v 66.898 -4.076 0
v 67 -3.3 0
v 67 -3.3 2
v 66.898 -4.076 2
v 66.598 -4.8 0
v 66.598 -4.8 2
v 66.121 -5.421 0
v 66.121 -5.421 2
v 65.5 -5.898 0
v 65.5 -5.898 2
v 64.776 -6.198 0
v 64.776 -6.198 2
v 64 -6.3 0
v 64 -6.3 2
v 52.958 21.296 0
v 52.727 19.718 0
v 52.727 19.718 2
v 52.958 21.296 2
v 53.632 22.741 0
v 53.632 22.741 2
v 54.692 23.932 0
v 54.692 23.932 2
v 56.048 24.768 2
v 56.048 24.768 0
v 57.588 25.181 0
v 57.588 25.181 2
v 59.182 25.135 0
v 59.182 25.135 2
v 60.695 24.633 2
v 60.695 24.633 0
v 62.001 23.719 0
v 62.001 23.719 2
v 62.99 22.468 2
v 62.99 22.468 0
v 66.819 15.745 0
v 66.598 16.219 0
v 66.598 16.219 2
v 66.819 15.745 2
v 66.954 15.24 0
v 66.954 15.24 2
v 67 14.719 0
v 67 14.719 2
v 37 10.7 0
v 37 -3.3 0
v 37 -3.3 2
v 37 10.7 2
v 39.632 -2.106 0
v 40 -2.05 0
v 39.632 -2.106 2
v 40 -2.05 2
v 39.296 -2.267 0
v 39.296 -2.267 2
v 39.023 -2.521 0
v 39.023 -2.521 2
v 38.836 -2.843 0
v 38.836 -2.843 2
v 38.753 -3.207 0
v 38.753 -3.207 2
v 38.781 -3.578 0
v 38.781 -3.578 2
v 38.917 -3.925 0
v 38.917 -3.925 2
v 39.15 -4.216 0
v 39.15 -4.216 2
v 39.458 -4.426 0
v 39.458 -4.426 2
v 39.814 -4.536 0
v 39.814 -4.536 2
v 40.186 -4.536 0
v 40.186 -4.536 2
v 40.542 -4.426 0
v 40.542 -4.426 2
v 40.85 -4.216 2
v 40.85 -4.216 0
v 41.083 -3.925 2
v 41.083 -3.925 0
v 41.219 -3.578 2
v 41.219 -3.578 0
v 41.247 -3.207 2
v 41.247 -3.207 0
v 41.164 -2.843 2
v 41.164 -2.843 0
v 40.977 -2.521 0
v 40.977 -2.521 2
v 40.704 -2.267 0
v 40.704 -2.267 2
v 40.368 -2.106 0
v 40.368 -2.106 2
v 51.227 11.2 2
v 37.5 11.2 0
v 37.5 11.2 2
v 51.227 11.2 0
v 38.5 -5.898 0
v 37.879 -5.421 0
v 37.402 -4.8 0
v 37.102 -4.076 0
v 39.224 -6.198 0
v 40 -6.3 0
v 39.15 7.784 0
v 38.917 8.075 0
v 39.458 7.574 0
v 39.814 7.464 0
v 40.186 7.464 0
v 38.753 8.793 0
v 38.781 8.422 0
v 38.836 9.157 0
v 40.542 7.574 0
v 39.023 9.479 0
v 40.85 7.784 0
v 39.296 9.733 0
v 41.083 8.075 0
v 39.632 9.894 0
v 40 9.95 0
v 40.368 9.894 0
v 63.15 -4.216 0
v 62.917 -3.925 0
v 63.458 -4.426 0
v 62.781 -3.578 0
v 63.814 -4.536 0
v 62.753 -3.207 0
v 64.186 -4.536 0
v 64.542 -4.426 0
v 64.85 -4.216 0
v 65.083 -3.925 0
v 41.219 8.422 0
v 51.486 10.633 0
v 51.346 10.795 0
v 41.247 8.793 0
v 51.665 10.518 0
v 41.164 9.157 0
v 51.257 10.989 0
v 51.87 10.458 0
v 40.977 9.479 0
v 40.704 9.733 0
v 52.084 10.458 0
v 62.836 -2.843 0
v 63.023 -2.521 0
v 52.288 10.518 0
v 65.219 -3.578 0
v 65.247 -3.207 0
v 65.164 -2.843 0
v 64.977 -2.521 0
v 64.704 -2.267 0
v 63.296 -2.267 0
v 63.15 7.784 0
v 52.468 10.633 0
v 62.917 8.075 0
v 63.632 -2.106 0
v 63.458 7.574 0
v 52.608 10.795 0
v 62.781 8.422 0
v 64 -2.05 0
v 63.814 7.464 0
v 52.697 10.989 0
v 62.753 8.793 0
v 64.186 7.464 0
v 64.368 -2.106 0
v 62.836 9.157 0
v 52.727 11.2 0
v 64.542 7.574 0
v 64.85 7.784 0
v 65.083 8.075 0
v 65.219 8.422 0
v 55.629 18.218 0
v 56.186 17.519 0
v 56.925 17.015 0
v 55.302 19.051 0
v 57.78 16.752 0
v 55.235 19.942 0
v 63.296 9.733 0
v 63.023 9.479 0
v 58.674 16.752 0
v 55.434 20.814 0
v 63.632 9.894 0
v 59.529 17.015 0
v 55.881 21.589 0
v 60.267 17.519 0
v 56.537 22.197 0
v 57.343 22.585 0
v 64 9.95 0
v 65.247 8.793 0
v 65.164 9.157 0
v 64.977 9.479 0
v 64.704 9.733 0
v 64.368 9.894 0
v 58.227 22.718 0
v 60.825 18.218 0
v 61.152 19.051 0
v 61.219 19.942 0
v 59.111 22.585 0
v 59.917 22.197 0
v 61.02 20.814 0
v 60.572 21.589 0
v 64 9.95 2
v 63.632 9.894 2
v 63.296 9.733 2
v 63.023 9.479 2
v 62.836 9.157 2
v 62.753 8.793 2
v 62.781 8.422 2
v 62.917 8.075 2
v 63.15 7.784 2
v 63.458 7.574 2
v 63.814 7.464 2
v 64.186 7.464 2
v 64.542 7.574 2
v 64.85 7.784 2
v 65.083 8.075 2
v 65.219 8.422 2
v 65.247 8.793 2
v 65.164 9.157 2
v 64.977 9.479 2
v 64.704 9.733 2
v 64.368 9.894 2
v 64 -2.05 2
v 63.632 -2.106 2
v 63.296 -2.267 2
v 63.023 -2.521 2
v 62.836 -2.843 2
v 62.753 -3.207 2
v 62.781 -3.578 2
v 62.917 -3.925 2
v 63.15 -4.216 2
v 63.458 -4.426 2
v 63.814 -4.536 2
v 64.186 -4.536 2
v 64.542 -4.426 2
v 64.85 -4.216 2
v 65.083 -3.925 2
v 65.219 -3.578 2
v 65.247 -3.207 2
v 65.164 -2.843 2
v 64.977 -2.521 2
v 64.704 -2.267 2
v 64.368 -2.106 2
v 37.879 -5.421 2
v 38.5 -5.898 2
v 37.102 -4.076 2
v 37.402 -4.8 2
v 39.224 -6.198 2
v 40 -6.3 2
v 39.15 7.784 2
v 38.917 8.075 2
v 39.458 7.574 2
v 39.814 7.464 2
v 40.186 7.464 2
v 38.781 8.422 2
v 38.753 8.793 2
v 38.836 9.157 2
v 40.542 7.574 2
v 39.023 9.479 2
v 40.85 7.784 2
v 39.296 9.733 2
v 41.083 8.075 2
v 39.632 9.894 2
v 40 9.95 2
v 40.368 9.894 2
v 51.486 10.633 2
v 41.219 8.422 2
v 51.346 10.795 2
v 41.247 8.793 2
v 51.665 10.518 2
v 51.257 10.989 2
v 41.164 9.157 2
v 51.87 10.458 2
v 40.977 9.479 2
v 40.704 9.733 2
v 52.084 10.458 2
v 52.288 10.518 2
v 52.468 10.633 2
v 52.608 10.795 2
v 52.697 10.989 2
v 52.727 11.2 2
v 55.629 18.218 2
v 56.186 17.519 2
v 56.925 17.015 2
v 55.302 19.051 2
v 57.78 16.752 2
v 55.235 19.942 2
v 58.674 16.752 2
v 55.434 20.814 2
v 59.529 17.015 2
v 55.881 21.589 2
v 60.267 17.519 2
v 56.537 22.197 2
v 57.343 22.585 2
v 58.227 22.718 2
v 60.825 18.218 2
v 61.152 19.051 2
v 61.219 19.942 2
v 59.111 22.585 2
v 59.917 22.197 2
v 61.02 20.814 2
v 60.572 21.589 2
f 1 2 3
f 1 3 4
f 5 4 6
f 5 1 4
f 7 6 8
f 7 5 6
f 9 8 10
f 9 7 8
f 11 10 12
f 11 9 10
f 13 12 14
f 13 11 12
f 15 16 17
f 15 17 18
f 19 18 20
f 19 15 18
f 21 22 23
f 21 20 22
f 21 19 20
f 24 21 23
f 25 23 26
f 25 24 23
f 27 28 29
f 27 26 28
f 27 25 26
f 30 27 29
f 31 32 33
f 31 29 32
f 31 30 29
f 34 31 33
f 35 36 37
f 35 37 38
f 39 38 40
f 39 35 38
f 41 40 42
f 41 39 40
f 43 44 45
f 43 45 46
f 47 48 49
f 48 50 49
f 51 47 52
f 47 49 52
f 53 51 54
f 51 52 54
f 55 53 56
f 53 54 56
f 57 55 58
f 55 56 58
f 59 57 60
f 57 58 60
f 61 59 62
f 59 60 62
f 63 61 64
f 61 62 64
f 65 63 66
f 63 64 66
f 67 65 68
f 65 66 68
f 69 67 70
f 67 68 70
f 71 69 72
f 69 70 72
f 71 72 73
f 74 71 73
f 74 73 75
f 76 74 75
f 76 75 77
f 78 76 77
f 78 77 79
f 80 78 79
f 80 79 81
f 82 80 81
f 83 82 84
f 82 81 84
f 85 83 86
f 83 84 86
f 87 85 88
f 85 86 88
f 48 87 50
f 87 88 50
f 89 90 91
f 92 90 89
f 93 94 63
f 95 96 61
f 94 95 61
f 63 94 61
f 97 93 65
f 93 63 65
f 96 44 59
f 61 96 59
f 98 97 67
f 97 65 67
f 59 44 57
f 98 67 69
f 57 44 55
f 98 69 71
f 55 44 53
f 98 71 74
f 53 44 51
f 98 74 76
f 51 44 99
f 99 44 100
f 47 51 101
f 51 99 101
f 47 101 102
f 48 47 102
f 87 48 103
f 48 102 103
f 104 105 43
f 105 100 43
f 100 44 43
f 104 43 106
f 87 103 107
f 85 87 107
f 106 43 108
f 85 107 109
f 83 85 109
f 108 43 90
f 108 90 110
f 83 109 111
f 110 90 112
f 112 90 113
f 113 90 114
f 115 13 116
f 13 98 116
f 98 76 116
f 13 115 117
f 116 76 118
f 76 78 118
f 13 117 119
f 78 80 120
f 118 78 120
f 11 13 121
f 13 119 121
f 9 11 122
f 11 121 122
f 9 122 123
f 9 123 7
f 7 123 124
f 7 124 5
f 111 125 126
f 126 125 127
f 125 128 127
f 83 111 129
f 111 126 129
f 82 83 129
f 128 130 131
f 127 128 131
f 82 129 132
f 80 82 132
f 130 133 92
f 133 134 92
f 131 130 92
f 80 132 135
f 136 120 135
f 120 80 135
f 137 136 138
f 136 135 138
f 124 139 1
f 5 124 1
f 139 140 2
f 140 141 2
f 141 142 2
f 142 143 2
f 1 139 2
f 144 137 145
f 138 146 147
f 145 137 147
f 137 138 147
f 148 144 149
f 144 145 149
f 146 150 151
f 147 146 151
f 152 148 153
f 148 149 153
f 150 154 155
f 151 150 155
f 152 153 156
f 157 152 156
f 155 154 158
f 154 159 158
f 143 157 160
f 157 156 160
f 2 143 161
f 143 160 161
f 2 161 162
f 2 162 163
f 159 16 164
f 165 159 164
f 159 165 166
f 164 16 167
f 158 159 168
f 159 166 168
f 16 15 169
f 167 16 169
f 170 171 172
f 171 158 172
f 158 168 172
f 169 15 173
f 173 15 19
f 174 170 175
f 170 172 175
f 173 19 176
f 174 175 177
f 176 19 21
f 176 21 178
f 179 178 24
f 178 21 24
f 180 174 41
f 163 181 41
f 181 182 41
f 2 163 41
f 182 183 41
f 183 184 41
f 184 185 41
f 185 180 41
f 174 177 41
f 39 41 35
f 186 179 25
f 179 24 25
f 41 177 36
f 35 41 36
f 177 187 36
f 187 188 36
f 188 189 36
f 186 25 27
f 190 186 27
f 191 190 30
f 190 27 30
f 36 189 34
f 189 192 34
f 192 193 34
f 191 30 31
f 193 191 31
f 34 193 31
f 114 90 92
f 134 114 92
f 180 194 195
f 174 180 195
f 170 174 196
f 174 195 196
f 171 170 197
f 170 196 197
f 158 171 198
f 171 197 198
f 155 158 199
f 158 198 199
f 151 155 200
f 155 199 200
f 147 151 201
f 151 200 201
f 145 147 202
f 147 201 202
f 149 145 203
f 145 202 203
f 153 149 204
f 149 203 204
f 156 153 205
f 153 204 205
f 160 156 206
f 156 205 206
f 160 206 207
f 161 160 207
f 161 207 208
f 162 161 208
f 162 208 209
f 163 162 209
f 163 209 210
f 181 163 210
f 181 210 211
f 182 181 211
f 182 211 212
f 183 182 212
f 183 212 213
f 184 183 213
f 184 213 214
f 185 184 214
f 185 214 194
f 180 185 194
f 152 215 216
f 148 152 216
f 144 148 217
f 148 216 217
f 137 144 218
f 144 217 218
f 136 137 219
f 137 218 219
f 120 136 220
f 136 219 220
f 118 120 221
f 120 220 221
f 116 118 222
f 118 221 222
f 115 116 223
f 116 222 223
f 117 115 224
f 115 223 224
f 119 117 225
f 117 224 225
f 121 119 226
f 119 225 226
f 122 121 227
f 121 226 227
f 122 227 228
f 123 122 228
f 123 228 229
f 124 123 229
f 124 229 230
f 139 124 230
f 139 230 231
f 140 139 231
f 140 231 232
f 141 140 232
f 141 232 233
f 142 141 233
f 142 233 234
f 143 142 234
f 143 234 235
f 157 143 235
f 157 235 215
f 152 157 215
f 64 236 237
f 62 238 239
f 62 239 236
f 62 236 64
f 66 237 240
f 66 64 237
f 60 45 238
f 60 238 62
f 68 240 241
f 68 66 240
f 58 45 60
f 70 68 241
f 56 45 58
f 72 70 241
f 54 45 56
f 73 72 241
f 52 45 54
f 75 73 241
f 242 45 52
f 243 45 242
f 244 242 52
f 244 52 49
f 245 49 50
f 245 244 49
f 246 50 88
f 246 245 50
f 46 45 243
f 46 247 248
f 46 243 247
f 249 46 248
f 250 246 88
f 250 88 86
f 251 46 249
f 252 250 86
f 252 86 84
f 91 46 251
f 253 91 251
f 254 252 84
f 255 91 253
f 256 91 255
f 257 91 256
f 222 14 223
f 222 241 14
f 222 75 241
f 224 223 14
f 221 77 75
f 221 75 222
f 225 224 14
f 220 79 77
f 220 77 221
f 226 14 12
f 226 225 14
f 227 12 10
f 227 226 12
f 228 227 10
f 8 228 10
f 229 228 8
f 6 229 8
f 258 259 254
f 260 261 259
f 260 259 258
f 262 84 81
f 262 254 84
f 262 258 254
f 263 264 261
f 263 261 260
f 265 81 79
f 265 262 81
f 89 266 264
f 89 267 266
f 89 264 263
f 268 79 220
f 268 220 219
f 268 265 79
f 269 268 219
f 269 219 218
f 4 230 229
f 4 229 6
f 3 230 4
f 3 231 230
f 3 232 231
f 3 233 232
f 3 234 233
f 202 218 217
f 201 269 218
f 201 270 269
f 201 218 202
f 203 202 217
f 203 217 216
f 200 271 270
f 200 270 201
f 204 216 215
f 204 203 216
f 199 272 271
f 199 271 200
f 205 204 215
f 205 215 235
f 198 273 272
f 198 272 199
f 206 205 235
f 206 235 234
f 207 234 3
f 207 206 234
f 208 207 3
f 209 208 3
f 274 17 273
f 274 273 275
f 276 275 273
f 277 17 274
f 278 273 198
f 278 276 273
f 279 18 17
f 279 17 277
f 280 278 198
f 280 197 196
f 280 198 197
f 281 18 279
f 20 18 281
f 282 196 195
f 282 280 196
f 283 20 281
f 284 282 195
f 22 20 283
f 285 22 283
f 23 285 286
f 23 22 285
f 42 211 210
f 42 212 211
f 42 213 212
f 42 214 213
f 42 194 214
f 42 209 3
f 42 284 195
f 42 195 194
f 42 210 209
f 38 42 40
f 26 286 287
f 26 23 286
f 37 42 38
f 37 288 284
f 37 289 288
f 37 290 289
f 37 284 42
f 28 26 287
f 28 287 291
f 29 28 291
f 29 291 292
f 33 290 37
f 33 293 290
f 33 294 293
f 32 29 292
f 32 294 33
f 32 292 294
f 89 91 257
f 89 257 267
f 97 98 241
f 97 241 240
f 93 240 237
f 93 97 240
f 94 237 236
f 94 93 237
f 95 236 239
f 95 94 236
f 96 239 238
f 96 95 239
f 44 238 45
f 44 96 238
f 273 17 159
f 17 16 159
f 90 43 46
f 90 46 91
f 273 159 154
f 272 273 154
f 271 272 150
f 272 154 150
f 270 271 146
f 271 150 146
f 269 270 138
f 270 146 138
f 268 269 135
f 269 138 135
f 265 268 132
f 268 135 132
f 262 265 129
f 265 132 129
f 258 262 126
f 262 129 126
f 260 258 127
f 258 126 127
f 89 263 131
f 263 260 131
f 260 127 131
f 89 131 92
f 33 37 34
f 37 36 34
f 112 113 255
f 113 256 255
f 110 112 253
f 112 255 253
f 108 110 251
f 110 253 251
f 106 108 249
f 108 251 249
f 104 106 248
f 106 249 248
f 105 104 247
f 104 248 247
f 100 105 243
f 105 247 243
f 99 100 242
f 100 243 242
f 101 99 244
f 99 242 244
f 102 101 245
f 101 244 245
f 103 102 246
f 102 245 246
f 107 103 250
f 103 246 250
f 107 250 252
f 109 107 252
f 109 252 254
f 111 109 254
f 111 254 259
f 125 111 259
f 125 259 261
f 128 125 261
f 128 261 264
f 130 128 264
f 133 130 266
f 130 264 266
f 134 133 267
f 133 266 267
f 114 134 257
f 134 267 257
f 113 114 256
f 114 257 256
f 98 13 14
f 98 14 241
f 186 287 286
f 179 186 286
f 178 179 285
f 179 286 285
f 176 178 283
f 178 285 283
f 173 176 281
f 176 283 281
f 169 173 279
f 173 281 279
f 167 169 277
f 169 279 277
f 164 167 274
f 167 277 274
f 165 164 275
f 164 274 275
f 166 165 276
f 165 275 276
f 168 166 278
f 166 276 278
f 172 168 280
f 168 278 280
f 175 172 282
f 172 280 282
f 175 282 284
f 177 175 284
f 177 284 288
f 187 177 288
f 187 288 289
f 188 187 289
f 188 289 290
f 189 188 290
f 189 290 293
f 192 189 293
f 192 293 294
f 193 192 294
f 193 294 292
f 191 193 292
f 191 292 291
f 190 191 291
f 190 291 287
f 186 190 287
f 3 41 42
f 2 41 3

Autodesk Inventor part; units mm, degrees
ref_plane "YZ Plane" through (0, 0, 0) normal (1, 0, 0) x (0, 1, 0)
ref_plane "XZ Plane" through (0, 0, 0) normal (0, 1, 0) x (-1, 0, 0)
ref_plane "XY Plane" through (0, 0, 0) normal (0, 0, 1) x (1, 0, 0)
sketch "スケッチ1" plane through (0, 0, 0) normal (0, 0, 1) x (1, 0, 0)
  line L0 (54.882, 0) -> (12, 60) construction
  line L1 (54.882, 0) -> (70, -21.1529)
  line L2 (70, -21.1529) -> (35, -33.1249)
  line L3 (0, 0) -> (0, 100.7114)
  line L4 (0, 0) -> (54.882, 0) construction
  arc A0 (24.927, 26.5822) -> (24.2651, 18.1082) centre (58.2269, 19.7183) ccw construction
  arc A1 (17.0917, 28.1972) -> (16.274, 17.7294) centre (58.2269, 19.7183) ccw construction
  arc A2 (16.274, 17.7294) -> (24.2651, 18.1082) centre (20.2695, 17.9188) ccw construction
  line L5 (20.2695, 17.9188) -> (58.2269, 19.7183) construction
  line L6 (58.2269, 19.7183) -> (20.6135, 25.1248)
  arc A3 (20.6135, 25.1248) -> (20.2695, 17.9188) centre (58.2269, 19.7183) ccw construction
  line L7 (20.2695, 17.9188) -> (68.8874, -17.2423) construction
  line L8 (68.8874, -17.2423) -> (71.9395, 19.6224) construction
  line L9 (20.6135, 25.1248) -> (35, -33.1249)
  line L10 (20.6135, 25.1248) -> (12, 60) construction
  line L11 (20.6135, 25.1248) -> (54.882, 0) construction
  arc A4 (57.1481, -25.9011) -> (71.9395, 19.6224) centre (54.882, 0) ccw
  line L12 (35, -33.1249) -> (70, -33.1249) construction
  line L13 (70, -33.1249) -> (70, -21.1529) construction
  line L14 (27.4112, -33.1249) -> (45, -293.1249) construction
  line L15 (54.882, 0) -> (53.4072, -2.6124)
  line L16 (54.882, 0) -> (52.2839, -1.5) construction
  arc A5 (52.2839, -1.5) -> (57.7658, -0.8269) centre (54.882, 0) ccw construction
  line L17 (54.882, 0) -> (52.8265, -2.1851) construction
  line L18 (54.882, 0) -> (53.5434, -2.6848) construction
  line L19 (54.882, 0) -> (54.374, -2.9567) construction
  line L20 (54.882, 0) -> (55.2476, -2.9776) construction
  line L21 (54.882, 0) -> (56.0902, -2.7459) construction
  line L22 (54.882, 0) -> (56.8303, -2.2812) construction
  line L23 (54.882, 0) -> (57.4051, -1.6229) construction
  line L24 (54.882, 0) -> (57.7658, -0.8269) construction
  line L25 (58.2269, 19.7183) -> (53.4072, -2.6124)
  line L26 (52.2839, -1.5) -> (58.2269, 19.7183) construction
  line L27 (58.2269, 19.7183) -> (57.7658, -0.8269) construction
  line L28 (55.5792, -7.9696) -> (57.1481, -25.9011) construction
  line L29 (57.8465, -7.4305) -> (64.5165, -24.149) construction
  line L30 (59.8621, -6.2609) -> (71.0674, -20.3478) construction
  line L31 (61.4552, -4.56) -> (76.2448, -14.8199) construction
  line L32 (62.4905, -2.4721) -> (79.6095, -8.0344) construction
  line L33 (62.8801, -0.1745) -> (80.8758, -0.5672) construction
  line L34 (62.591, 2.1379) -> (79.9364, 6.9482) construction
  line L35 (61.6478, 4.2689) -> (76.8709, 13.874) construction
  line L36 (60.1305, 6.0377) -> (71.9395, 19.6224) construction
  arc A6 (55.5792, -7.9696) -> (60.1305, 6.0377) centre (54.882, 0) ccw construction
  line L37 (21.0093, 27.3897) -> (58.2269, 19.7183) construction
  arc A7 (21.0093, 27.3897) -> (20.6135, 25.1248) centre (58.2269, 19.7183) ccw construction
  arc A8 (24.927, 26.5822) -> (17.0917, 28.1972) centre (21.0093, 27.3897) ccw construction
  line L38 (52.8265, -2.1851) -> (58.2269, 19.7183) construction
  line L39 (58.2269, 19.7183) -> (20.7871, 26.2192) construction
  line L40 (20.5792, 24.8807) -> (58.2269, 19.7183) construction
  line L41 (53.5434, -2.6848) -> (58.2269, 19.7183) construction
  line L42 (21.0093, 27.3897) -> (20.7706, -32.6098) construction
  line L43 (20.7706, -32.6098) -> (57.1481, -25.9011) construction
  line L44 (20.7871, 26.2192) -> (28.6655, -33.2613) construction
  line L45 (28.6655, -33.2613) -> (64.5165, -24.149) construction
  line L46 (35, -33.1249) -> (45, -293.1249)
  line L47 (70, -21.1529) -> (45, -293.1249)
  line L48 (28.6655, -33.2613) -> (17.6783, -293.2214) construction
  line L49 (17.6783, -293.2214) -> (64.5165, -24.149) construction
  line L50 (57.1481, -25.9011) -> (-7.4742, -291.2645) construction
  line L51 (-7.4742, -291.2645) -> (20.7706, -32.6098) construction
  line L52 (58.2269, 19.7183) -> (20.4111, 23.4553) construction
  line L53 (58.2269, 19.7183) -> (20.2969, 22.0239) construction
  line L54 (58.2269, 19.7183) -> (20.2388, 20.6688) construction
  line L55 (58.2269, 19.7183) -> (20.2277, 19.4745) construction
  line L56 (58.2269, 19.7183) -> (20.2456, 18.5281) construction
  line L57 (58.2269, 19.7183) -> (54.374, -2.9567) construction
  line L58 (58.2269, 19.7183) -> (55.2476, -2.9776) construction
  line L59 (58.2269, 19.7183) -> (56.0902, -2.7459) construction
  line L60 (58.2269, 19.7183) -> (56.8303, -2.2812) construction
  line L61 (58.2269, 19.7183) -> (57.4051, -1.6229) construction
  line L62 (20.5792, 24.8807) -> (36.3145, -33.0192) construction
  line L63 (36.3145, -33.0192) -> (71.0674, -20.3478) construction
  line L64 (76.2448, -14.8199) -> (43.4556, -31.9429) construction
  line L65 (43.4556, -31.9429) -> (20.4111, 23.4553) construction
  line L66 (20.2969, 22.0239) -> (49.9482, -30.1374) construction
  line L67 (49.9482, -30.1374) -> (79.6095, -8.0344) construction
  line L68 (80.8758, -0.5672) -> (55.7371, -27.7034) construction
  line L69 (55.7371, -27.7034) -> (20.2388, 20.6688) construction
  line L70 (20.2277, 19.4745) -> (60.8132, -24.7162) construction
  line L71 (60.8132, -24.7162) -> (79.9364, 6.9482) construction
  line L72 (76.8709, 13.874) -> (65.1878, -21.2235) construction
  line L73 (65.1878, -21.2235) -> (20.2456, 18.5281) construction
  line L74 (36.3145, -33.0192) -> (51.5259, -292.7664) construction
  line L75 (71.9395, 19.6224) -> (311.1178, -112.2394) construction
  line L76 (311.1178, -112.2394) -> (68.8874, -17.2423) construction
  line L77 (76.8709, 13.874) -> (278.0839, -170.8071) construction
  line L78 (278.0839, -170.8071) -> (65.1878, -21.2235) construction
  line L79 (60.8132, -24.7162) -> (235.5555, -217.4988) construction
  line L80 (235.5555, -217.4988) -> (79.9364, 6.9482) construction
  line L81 (80.8758, -0.5672) -> (187.8232, -251.8758) construction
  line L82 (187.8232, -251.8758) -> (55.7371, -27.7034) construction
  line L83 (49.9482, -30.1374) -> (138.9893, -274.6199) construction
  line L84 (138.9893, -274.6199) -> (79.6095, -8.0344) construction
  line L85 (76.2448, -14.8199) -> (92.626, -287.4468) construction
  line L86 (92.626, -287.4468) -> (43.4556, -31.9429) construction
  line L87 (51.5259, -292.7664) -> (71.0674, -20.3478) construction
  spline S0 degree 4 poles (-7.4742, -291.2645) (-12.2705, -294.3182) (60.154, -292.0463) (27.8526, -295.3281) (110.0905, -286.5066) (139.1565, -274.7713) (216.3886, -242.7571) (259.5293, -197.6399) (297.4502, -150.2821) (311.1178, -112.2394) knots 0 0 0 0 0 0.20634 0.298589 0.40005 0.523805 0.654143 1 1 1 1 1 construction
  spline S1 degree 4 poles (20.7706, -32.6098) (25.5837, -33.2782) (32.3307, -33.6056) (40.6453, -32.8812) (49.7904, -30.3738) (57.6947, -27.0887) (63.1804, -23.3839) (66.7313, -19.9462) (68.8874, -17.2423) knots 0 0 0 0 0 0.335801 0.464563 0.589185 0.709887 1 1 1 1 1
  circle A9 centre (58.2269, 19.7183) radius 4 construction
  line L88 (0, 0) -> (0, -360.4465)
  point P0 (54.882, 0)
  point P1 (54.882, 0)
  point P2 (54.882, 0)
  point P3 (54.882, 0)
  point P4 (54.882, 0)
  point P5 (54.882, 0)
  point P6 (54.882, 0)
  point P7 (54.882, 0)
  dimension "d5" = 60
  dimension "d66" = 26
  dimension "d67" = 35
  dimension "d74" = 65
  dimension "d76" = 3
  dimension "d80" = 134
  dimension "d82" = 20
  dimension "d85" = 134
  dimension "d87" = 65
  dimension "d88" = 60
  dimension "d89" = 86
  dimension "d90" = 86
  dimension "d91" = 86
  dimension "d92" = 4
  dimension "d93" = 86
  dimension "d94" = 86
  dimension "d95" = 95
  dimension "d96" = 86
  dimension "d97" = 86
  dimension "d98" = 86
  dimension "d99" = 86
  dimension "d100" = 86
  dimension "d101" = 8
  dimension "d102" = 12
  dimension "d104" = 74.818
  dimension "d105" = 8
  dimension "d106" = 75.286
  dimension "d111" = 11.972
  dimension "d113" = 70
  dimension "d114" = 38
  dimension "d116" = 90
  dimension "d117" = 260
sketch "スケッチ2" plane through (0, 0, 0) normal (0, 0, 1) x (1, 0, 0)
  arc A0 (62.99, 22.4683) -> (52.7269, 19.7183) centre (58.2269, 19.7183) ccw
  line L0 (40, 8.7) -> (64, 8.7) construction
  line L1 (64, 8.7) -> (64, -3.3) construction
  line L2 (64, -3.3) -> (40, -3.3) construction
  line L3 (40, -3.3) -> (40, 8.7) construction
  line L4 (36, 10.1673) -> (36, -48.9437) construction
  line L5 (67, 14.719) -> (67, -3.3)
  line L6 (64, -6.3) -> (40, -6.3)
  line L7 (37, -3.3) -> (37, 10.7)
  arc A1 (37, -3.3) -> (40, -6.3) centre (40, -3.3) ccw
  arc A2 (64, -6.3) -> (67, -3.3) centre (64, -3.3) ccw
  line L8 (0, 0) -> (0, -59.5537) construction
  line L9 (10.6628, 2.7) -> (66.9205, 2.7) construction
  line L10 (66.5981, 16.219) -> (62.99, 22.4683)
  arc A3 (67, 14.719) -> (66.5981, 16.219) centre (64, 14.719) ccw
  line L11 (37.5, 11.2) -> (51.2269, 11.2)
  line L12 (52.7269, 19.7183) -> (52.7269, 11.2)
  arc A4 (51.2269, 11.2) -> (52.7269, 11.2) centre (51.9769, 11.2) ccw
  line L13 (37, 10.7) -> (37.5, 11.2)
  point P0 (67, 15.5229)
  point P1 (36.9922, 11.2)
  point P2 (37, 11.2)
  dimension "d16" = 24
  dimension "d17" = 4
  dimension "d18" = 12
  dimension "d20" = 72
  dimension "d23" = 5.5
  dimension "d108" = 3
  dimension "d109" = 30
  dimension "d118" = 2.7
  dimension "d119" = 3
  dimension "d120" = 0.75
  dimension "d121" = 0.5
  dimension "d122" = 0.5
  dimension "d124" = 8.5
extrude "押し出し1" add sketch "スケッチ2" along normal blind 2
hole "穴1" at (58.2269, 19.7183, 0) direction (0, 0, 1) diameter 6 end through all
hole "穴2" at (64, 8.7, 0) at (40, 8.7, 0) at (40, -3.3, 0) at (64, -3.3, 0) direction (0, 0, 1) diameter 2.5 end through all
equation "\"input_link_length\" = 26"
equation "\"input_link_formed_angle\" = 65deg"
equation "\"support_formed_angle\" = 86deg"
equation "\"input_slider_radius\" = 3"
equation "\"driver_rotation_range\" = 134deg"
equation "\"virtual_mass_point_x\" = 12"
equation "\"driver_min_angle\" = 95deg"
equation "\"coupler_x\" = 35"
equation "\"support_link_length\" = 38"
properties part number "COXA_YAW_SERVO_BASE"
